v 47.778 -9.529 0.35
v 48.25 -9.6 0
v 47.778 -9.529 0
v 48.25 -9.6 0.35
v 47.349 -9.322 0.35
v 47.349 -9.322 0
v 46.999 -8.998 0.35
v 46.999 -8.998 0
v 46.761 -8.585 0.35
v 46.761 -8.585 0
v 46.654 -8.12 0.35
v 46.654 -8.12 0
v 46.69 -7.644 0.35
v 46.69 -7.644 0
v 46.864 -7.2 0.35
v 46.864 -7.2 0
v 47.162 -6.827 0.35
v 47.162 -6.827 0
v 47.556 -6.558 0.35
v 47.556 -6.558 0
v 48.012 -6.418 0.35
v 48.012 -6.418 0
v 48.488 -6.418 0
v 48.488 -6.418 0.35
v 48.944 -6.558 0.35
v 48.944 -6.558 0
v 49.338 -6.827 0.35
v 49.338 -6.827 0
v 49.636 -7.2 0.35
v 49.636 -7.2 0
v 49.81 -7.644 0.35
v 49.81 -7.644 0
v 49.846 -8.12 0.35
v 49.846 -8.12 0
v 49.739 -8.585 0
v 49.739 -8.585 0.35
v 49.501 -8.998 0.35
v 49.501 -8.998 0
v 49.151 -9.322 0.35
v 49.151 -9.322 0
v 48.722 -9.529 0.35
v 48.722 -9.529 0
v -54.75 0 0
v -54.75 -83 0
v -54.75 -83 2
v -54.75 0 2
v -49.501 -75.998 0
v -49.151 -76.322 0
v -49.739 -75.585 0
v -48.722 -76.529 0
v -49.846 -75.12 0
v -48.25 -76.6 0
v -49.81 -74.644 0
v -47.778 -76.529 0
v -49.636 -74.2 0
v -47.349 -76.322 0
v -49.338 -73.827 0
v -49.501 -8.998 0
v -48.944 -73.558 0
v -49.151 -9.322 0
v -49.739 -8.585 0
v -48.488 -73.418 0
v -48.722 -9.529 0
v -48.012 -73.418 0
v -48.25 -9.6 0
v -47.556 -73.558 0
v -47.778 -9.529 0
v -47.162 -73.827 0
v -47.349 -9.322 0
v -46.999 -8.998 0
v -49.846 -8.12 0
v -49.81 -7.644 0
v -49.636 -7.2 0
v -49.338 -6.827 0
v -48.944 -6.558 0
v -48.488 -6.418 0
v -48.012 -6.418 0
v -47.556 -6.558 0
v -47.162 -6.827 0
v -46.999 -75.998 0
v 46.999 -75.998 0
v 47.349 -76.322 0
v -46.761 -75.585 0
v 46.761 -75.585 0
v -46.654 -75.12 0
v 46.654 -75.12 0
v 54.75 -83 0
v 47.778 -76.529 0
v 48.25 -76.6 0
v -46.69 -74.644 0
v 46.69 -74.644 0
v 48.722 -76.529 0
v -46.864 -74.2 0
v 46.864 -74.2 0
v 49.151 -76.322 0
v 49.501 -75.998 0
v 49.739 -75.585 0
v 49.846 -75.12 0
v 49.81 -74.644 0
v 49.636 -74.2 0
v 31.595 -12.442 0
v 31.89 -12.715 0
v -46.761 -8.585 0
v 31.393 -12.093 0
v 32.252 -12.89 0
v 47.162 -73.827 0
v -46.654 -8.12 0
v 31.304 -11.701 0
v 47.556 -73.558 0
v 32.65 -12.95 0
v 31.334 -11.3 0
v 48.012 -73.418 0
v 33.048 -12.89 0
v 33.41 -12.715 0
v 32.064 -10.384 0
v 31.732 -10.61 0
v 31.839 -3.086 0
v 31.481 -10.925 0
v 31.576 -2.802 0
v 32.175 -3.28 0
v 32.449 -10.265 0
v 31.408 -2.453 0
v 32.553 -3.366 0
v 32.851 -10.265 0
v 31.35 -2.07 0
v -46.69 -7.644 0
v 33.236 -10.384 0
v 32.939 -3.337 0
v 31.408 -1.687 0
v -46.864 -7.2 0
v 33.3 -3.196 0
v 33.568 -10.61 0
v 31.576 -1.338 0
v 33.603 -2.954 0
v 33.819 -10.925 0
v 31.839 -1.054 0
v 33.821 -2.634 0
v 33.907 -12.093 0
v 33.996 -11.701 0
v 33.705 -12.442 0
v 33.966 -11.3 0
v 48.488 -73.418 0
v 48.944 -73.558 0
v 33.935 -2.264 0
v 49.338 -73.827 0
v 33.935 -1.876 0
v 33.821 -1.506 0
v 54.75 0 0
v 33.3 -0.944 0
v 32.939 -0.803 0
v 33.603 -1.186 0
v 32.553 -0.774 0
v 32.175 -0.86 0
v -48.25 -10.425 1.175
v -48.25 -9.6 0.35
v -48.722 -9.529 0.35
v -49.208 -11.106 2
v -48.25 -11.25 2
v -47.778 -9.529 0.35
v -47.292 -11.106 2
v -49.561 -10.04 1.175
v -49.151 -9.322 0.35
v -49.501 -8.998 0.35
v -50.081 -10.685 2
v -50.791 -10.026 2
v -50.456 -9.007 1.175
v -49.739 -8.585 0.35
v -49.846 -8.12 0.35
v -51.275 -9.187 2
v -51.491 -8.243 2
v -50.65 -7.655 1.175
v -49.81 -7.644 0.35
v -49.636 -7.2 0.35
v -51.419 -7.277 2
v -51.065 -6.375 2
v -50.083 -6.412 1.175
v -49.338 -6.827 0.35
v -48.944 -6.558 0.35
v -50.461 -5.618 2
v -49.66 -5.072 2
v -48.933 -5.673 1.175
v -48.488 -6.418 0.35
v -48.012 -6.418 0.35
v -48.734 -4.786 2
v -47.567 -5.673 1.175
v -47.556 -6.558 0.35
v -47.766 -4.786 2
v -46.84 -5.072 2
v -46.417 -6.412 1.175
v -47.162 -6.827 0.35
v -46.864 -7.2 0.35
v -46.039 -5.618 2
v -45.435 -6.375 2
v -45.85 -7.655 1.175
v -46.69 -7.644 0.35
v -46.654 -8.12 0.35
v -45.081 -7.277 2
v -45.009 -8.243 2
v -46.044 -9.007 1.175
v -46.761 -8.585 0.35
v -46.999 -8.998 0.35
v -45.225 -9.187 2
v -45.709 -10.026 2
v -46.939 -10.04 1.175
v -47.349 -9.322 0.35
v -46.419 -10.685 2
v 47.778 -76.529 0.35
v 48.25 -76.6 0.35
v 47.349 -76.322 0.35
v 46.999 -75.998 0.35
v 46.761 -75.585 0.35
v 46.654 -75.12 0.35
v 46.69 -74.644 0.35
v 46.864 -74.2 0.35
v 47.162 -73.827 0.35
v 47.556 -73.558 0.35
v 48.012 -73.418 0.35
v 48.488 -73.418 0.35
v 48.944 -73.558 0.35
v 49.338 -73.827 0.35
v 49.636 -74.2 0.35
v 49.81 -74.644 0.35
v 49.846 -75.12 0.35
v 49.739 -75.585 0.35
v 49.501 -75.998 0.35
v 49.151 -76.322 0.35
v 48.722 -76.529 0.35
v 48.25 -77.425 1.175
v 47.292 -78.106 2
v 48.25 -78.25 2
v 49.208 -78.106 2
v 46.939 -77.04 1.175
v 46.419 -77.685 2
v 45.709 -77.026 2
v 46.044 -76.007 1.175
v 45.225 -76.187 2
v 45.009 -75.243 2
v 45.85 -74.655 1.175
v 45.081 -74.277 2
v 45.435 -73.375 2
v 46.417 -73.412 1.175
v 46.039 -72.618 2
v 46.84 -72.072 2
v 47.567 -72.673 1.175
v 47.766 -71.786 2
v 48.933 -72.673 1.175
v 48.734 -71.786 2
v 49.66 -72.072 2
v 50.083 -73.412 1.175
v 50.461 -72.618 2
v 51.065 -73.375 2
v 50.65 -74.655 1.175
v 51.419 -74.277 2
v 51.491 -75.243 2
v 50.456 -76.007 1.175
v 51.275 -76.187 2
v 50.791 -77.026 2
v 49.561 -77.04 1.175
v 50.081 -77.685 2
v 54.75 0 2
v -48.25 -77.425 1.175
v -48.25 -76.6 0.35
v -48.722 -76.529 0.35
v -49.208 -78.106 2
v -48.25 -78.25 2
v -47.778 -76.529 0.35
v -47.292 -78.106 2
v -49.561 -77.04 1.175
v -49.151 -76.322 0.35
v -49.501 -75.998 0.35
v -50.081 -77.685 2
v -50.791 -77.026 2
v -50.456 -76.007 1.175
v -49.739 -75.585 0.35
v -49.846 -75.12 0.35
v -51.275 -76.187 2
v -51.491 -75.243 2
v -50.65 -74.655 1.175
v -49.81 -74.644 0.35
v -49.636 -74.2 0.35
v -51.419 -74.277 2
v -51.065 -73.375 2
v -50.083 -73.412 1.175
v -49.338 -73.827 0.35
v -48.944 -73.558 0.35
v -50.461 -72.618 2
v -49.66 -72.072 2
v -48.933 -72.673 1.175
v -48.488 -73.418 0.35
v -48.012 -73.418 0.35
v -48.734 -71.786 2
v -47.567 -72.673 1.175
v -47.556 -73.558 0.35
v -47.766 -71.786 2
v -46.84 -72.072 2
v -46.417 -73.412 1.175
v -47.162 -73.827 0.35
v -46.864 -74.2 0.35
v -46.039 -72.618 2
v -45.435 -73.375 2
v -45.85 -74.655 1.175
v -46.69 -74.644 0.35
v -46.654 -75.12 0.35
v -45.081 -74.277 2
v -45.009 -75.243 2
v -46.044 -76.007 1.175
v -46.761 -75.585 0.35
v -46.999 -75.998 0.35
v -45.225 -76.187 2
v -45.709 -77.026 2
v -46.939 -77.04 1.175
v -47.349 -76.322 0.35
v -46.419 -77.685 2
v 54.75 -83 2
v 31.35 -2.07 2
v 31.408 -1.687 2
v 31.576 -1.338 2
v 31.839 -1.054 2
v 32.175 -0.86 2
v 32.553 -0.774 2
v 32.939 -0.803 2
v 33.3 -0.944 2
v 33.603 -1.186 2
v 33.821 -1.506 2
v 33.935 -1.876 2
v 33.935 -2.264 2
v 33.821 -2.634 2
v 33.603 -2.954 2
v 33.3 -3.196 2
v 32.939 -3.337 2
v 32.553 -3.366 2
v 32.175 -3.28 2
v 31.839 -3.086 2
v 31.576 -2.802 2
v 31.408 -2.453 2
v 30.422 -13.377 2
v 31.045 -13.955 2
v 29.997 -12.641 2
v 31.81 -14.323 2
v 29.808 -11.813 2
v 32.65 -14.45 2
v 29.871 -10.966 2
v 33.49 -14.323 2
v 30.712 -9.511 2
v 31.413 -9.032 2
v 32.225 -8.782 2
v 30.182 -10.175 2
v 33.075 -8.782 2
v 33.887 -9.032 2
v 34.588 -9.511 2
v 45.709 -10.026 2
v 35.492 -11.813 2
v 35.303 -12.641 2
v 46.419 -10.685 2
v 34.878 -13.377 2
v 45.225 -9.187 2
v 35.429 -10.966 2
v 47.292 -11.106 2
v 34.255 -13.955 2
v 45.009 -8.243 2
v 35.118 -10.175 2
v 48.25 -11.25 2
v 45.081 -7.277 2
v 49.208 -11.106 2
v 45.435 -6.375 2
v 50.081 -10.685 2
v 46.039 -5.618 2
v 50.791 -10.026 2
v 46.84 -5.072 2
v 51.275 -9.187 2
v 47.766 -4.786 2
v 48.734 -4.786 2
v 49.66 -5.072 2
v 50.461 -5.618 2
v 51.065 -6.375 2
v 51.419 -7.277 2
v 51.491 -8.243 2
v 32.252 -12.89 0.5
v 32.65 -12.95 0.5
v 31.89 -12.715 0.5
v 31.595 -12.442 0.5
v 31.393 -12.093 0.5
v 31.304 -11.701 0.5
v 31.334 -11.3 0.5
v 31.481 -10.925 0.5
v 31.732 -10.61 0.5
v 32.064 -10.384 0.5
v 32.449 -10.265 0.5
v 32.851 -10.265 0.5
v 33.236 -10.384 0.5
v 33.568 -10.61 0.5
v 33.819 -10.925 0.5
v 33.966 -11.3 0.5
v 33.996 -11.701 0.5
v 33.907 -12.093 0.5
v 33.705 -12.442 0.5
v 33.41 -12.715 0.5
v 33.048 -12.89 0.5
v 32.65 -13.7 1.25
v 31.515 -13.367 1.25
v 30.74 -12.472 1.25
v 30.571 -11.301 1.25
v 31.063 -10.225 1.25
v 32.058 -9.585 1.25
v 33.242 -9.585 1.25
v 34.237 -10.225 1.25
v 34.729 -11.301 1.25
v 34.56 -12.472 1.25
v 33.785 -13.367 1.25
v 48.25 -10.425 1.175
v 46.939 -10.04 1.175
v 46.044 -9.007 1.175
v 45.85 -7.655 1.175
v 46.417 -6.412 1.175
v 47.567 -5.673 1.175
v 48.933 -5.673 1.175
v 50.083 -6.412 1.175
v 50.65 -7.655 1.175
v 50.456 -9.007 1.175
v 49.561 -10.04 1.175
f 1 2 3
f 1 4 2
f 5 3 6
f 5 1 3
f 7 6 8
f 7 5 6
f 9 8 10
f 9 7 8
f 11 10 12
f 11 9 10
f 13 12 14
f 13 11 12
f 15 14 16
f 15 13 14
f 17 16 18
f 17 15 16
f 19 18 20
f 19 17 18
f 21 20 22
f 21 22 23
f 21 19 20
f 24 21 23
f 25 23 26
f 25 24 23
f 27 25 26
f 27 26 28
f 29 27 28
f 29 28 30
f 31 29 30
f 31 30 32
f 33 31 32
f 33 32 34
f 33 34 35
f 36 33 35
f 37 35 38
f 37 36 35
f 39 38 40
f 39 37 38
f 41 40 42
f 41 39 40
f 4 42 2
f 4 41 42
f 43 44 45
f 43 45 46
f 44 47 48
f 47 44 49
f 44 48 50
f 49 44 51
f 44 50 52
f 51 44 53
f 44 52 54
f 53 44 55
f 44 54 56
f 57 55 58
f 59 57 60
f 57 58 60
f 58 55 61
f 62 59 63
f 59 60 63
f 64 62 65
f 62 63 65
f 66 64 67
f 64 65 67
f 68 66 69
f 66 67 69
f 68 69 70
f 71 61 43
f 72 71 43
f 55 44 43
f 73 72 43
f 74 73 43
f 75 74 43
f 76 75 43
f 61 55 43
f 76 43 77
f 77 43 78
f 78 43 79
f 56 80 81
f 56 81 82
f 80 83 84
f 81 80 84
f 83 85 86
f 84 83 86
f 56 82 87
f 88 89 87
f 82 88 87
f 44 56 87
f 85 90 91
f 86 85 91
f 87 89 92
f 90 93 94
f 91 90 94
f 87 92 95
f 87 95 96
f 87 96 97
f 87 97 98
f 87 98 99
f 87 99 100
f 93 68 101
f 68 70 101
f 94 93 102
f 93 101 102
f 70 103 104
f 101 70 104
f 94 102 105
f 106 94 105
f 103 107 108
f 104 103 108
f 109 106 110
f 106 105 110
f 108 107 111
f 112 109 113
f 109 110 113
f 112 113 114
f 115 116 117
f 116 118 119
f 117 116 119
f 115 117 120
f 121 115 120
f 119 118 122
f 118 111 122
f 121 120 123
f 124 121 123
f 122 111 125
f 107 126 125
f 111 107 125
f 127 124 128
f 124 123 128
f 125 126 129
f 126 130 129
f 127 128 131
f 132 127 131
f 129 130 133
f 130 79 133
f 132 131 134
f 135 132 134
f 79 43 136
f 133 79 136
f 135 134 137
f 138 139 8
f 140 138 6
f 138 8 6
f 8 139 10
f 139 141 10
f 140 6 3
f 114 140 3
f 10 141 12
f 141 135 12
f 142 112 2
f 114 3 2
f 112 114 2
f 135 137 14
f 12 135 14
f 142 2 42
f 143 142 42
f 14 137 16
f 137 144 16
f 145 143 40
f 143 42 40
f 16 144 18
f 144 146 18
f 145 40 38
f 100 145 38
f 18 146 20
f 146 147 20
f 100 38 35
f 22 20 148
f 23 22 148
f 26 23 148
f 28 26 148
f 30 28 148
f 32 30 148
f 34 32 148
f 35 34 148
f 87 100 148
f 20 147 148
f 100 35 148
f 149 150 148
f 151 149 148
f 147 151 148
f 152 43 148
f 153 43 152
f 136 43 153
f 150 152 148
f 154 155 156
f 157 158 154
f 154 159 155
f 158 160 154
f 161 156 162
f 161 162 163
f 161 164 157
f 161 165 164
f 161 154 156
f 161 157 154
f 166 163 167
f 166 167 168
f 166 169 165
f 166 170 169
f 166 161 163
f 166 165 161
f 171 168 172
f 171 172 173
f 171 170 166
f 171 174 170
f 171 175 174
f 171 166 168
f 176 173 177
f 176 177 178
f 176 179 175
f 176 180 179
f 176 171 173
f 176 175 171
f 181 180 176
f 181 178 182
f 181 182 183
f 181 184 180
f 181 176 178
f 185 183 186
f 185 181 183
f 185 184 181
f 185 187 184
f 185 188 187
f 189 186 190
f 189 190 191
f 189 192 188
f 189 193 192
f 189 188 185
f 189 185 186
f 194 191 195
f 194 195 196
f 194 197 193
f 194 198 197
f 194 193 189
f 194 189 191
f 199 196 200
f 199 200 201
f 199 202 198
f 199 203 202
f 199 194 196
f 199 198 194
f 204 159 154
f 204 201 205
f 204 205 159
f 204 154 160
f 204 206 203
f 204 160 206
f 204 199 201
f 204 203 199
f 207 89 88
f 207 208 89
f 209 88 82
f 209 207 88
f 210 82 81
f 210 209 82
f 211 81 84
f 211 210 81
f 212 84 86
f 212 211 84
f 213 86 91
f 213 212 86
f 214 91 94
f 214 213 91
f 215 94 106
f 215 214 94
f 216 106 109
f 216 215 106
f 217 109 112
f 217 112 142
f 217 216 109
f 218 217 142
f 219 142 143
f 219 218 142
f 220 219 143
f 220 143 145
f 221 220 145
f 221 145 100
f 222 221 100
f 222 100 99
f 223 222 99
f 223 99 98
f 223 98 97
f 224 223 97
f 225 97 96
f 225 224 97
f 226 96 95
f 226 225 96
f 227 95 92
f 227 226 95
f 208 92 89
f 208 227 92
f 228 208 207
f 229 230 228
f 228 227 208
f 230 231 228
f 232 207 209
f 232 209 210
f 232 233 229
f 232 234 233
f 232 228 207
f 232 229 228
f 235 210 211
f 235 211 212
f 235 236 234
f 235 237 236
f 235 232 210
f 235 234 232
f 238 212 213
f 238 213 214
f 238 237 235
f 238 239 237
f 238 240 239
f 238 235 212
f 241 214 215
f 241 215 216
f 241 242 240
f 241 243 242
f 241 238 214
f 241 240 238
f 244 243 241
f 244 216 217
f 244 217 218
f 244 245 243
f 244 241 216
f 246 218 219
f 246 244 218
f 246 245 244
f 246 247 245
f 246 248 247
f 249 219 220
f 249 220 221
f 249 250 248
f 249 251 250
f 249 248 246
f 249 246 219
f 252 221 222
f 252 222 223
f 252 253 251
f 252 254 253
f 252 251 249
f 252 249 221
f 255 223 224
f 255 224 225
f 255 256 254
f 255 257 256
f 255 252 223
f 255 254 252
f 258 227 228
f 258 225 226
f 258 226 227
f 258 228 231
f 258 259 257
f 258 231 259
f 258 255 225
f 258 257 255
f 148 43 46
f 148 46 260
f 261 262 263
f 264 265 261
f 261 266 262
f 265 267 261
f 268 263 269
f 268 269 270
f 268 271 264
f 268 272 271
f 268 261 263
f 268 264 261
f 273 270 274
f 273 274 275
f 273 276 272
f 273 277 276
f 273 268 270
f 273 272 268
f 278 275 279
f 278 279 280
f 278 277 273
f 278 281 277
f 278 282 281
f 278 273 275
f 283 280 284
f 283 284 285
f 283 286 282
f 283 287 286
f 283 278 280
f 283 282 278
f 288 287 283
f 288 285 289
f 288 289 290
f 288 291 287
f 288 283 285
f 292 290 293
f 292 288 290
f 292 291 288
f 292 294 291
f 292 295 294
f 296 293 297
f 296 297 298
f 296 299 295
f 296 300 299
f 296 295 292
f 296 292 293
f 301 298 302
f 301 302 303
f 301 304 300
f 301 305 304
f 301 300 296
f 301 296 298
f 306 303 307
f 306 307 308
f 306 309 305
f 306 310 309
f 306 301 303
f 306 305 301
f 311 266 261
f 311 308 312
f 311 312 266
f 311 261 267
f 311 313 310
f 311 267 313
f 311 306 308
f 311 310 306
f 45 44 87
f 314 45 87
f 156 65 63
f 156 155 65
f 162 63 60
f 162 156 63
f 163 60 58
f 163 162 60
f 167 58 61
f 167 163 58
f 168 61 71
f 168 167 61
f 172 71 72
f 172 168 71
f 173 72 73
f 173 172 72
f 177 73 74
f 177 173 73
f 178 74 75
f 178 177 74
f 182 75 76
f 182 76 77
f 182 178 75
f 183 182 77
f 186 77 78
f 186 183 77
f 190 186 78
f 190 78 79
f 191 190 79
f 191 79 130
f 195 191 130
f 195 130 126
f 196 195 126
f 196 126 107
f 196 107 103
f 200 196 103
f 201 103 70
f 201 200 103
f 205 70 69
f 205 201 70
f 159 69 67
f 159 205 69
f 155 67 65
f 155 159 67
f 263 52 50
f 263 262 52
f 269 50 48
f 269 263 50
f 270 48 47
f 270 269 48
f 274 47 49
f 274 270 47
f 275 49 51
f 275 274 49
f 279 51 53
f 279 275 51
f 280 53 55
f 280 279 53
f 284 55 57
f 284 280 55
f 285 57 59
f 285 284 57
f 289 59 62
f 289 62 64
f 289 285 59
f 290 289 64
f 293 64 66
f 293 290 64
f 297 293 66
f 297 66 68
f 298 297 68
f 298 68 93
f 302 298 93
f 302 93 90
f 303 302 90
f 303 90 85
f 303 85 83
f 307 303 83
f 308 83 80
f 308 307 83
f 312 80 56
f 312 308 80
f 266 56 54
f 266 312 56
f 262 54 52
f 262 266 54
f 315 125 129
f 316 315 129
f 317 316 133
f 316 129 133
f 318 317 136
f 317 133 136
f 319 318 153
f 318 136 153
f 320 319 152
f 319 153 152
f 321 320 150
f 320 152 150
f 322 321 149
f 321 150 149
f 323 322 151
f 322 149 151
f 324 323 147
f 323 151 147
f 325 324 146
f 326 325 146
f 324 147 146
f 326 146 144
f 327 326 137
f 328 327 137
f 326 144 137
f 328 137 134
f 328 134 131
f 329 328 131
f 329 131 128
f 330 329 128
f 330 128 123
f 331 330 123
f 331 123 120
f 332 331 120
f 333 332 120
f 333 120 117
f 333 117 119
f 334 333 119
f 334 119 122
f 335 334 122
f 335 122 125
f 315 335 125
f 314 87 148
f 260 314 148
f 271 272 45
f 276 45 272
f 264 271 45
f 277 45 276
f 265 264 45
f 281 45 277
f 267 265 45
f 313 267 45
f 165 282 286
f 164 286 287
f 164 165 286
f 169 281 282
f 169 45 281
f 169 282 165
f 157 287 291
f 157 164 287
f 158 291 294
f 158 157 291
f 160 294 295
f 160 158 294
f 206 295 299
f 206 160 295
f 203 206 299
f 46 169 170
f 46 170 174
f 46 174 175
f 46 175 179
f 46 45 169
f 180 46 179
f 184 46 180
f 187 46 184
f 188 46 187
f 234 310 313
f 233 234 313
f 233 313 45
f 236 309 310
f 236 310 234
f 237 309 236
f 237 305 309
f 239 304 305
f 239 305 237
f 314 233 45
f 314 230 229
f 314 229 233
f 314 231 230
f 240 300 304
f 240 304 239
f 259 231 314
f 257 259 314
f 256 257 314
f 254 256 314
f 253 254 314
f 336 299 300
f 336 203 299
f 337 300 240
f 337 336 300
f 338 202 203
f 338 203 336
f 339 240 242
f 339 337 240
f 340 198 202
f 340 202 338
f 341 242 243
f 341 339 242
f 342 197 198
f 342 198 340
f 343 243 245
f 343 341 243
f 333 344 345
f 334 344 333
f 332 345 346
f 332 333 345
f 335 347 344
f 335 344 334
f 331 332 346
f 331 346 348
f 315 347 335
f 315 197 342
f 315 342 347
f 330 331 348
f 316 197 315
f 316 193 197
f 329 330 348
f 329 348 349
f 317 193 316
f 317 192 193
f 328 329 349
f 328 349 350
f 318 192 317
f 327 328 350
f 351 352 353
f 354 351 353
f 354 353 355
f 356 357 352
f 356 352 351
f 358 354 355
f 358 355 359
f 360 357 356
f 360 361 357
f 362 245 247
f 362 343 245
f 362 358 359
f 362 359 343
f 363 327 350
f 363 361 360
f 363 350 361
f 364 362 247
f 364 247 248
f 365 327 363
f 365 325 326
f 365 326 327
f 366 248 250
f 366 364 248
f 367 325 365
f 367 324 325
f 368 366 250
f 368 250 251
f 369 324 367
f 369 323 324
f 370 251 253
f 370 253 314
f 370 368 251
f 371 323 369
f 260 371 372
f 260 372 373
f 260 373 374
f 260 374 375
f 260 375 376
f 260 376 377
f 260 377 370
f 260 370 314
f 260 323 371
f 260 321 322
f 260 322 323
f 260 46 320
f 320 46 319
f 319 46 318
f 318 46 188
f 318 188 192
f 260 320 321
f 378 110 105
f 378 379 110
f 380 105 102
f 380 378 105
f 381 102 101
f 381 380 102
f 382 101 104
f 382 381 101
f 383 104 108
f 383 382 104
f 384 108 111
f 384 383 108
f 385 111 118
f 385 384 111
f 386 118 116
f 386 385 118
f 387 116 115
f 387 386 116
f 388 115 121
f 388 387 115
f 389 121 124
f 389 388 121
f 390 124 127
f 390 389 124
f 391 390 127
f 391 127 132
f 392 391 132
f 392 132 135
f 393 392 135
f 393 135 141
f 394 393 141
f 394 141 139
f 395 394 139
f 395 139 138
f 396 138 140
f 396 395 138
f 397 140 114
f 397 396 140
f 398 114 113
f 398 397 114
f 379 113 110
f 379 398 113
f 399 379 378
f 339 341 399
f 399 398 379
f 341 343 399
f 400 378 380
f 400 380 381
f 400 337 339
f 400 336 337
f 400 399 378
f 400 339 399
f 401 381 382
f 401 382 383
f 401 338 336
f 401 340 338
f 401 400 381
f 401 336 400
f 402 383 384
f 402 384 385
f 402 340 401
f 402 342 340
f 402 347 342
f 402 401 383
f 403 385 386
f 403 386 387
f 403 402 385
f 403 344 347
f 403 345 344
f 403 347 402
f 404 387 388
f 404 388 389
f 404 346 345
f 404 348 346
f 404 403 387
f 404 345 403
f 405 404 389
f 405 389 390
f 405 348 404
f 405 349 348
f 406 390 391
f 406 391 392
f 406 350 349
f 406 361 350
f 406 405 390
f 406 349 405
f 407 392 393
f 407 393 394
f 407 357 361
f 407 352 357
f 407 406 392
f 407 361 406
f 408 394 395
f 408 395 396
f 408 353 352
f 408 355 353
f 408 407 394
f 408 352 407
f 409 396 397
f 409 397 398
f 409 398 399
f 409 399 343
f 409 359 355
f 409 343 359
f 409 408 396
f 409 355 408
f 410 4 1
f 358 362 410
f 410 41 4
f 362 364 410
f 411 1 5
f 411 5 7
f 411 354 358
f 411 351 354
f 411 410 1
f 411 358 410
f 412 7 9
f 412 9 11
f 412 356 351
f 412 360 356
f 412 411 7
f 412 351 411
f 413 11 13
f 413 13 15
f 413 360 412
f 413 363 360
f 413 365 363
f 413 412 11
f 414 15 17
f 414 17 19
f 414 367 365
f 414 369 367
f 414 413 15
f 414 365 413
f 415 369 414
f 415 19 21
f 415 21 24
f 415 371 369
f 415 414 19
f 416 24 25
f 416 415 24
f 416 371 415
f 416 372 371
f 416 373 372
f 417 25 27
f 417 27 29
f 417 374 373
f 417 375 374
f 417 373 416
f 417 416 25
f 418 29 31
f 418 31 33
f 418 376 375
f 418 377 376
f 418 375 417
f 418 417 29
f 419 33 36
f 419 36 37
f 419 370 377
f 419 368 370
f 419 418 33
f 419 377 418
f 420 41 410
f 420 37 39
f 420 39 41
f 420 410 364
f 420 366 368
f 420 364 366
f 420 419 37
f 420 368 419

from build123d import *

# Parameters (mm, degrees)
SKETCH1_W                                    = 109.5
SKETCH1_H                                    = 83
BOSS_EXTRUDE1_DEPTH                          = 2
CSK_FOR_M3_FLAT_COUNTERSUNK_HEAD_SCR_2_COUNT = 2
CSK_FOR_M3_FLAT_COUNTERSUNK_HEAD_SCR_2_PITCH = 67
CSK_FOR_M3_FLAT_COUNTERSUNK_HEAD_SCR_3_COUNT = 2
CSK_FOR_M3_FLAT_COUNTERSUNK_HEAD_SCR_3_PITCH = 117.478721478
CSK_FOR_M3_FLAT_COUNTERSUNK_HEAD_SCR_4_COUNT = 2
CSK_FOR_M3_FLAT_COUNTERSUNK_HEAD_SCR_4_PITCH = 96.5
F_2_6_2_6_DIAMETER_HOLE1_D                   = 2.6


with BuildPart() as part:
    # Sketch1 → Boss-Extrude1 (new body)
    with BuildSketch(Plane.XY):
        with Locations((0, -41.5)):
            Rectangle(SKETCH1_W, SKETCH1_H)
    extrude(amount=BOSS_EXTRUDE1_DEPTH)

    # Sketch3 → CSK for M3 Flat Countersunk Head Screw1 (revolve, cut)
    with BuildSketch(Plane(origin=(-48.25, -8, 2), x_dir=(0, -1, 0), z_dir=(1, 0, 0))):
        Polygon((0, 0), (0, 2), (1.6, 2), (1.6, 1.65), (3.25, 0), align=None)
    csk_for_m3_flat_countersunk_head_screw1 = revolve(axis=Axis((-48.25, -8, 8.35), (0, 0, -1)), mode=Mode.SUBTRACT)

    # CSK for M3 Flat Countersunk Head Scr 2: CSK for M3 Flat Countersunk Head Screw1 ×2
    with Locations(*[(0, -i * CSK_FOR_M3_FLAT_COUNTERSUNK_HEAD_SCR_2_PITCH, 0) for i in range(1, CSK_FOR_M3_FLAT_COUNTERSUNK_HEAD_SCR_2_COUNT)]):
        add(csk_for_m3_flat_countersunk_head_screw1, mode=Mode.SUBTRACT)

    # CSK for M3 Flat Countersunk Head Scr 3: CSK for M3 Flat Countersunk Head Screw1 ×2
    with Locations(*[Vector(0.8214253507895062, -0.570316046662144, 0) * (i * CSK_FOR_M3_FLAT_COUNTERSUNK_HEAD_SCR_3_PITCH) for i in range(1, CSK_FOR_M3_FLAT_COUNTERSUNK_HEAD_SCR_3_COUNT)]):
        add(csk_for_m3_flat_countersunk_head_screw1, mode=Mode.SUBTRACT)

    # CSK for M3 Flat Countersunk Head Scr 4: CSK for M3 Flat Countersunk Head Screw1 ×2
    with Locations(*[(i * CSK_FOR_M3_FLAT_COUNTERSUNK_HEAD_SCR_4_PITCH, 0, 0) for i in range(1, CSK_FOR_M3_FLAT_COUNTERSUNK_HEAD_SCR_4_COUNT)]):
        add(csk_for_m3_flat_countersunk_head_screw1, mode=Mode.SUBTRACT)

    # Sketch5 → CSK for M2.5 Flat Countersunk Head Screw1 (revolve, cut)
    with BuildSketch(Plane(origin=(32.65, -11.6, 2), x_dir=(0, -1, 0), z_dir=(1, 0, 0))):
        Polygon((0, 0), (0, 2), (1.35, 2), (1.35, 1.5), (2.85, 0), align=None)
    revolve(axis=Axis((32.65, -11.6, 8.35), (0, 0, -1)), mode=Mode.SUBTRACT)

    # Ø2.6 (2.6) Diameter Hole1 (through all)
    with Locations(Plane.XY.offset(2)):
        with Locations((32.65, -2.07)):
            Hole(F_2_6_2_6_DIAMETER_HOLE1_D / 2)


solid = part.part
